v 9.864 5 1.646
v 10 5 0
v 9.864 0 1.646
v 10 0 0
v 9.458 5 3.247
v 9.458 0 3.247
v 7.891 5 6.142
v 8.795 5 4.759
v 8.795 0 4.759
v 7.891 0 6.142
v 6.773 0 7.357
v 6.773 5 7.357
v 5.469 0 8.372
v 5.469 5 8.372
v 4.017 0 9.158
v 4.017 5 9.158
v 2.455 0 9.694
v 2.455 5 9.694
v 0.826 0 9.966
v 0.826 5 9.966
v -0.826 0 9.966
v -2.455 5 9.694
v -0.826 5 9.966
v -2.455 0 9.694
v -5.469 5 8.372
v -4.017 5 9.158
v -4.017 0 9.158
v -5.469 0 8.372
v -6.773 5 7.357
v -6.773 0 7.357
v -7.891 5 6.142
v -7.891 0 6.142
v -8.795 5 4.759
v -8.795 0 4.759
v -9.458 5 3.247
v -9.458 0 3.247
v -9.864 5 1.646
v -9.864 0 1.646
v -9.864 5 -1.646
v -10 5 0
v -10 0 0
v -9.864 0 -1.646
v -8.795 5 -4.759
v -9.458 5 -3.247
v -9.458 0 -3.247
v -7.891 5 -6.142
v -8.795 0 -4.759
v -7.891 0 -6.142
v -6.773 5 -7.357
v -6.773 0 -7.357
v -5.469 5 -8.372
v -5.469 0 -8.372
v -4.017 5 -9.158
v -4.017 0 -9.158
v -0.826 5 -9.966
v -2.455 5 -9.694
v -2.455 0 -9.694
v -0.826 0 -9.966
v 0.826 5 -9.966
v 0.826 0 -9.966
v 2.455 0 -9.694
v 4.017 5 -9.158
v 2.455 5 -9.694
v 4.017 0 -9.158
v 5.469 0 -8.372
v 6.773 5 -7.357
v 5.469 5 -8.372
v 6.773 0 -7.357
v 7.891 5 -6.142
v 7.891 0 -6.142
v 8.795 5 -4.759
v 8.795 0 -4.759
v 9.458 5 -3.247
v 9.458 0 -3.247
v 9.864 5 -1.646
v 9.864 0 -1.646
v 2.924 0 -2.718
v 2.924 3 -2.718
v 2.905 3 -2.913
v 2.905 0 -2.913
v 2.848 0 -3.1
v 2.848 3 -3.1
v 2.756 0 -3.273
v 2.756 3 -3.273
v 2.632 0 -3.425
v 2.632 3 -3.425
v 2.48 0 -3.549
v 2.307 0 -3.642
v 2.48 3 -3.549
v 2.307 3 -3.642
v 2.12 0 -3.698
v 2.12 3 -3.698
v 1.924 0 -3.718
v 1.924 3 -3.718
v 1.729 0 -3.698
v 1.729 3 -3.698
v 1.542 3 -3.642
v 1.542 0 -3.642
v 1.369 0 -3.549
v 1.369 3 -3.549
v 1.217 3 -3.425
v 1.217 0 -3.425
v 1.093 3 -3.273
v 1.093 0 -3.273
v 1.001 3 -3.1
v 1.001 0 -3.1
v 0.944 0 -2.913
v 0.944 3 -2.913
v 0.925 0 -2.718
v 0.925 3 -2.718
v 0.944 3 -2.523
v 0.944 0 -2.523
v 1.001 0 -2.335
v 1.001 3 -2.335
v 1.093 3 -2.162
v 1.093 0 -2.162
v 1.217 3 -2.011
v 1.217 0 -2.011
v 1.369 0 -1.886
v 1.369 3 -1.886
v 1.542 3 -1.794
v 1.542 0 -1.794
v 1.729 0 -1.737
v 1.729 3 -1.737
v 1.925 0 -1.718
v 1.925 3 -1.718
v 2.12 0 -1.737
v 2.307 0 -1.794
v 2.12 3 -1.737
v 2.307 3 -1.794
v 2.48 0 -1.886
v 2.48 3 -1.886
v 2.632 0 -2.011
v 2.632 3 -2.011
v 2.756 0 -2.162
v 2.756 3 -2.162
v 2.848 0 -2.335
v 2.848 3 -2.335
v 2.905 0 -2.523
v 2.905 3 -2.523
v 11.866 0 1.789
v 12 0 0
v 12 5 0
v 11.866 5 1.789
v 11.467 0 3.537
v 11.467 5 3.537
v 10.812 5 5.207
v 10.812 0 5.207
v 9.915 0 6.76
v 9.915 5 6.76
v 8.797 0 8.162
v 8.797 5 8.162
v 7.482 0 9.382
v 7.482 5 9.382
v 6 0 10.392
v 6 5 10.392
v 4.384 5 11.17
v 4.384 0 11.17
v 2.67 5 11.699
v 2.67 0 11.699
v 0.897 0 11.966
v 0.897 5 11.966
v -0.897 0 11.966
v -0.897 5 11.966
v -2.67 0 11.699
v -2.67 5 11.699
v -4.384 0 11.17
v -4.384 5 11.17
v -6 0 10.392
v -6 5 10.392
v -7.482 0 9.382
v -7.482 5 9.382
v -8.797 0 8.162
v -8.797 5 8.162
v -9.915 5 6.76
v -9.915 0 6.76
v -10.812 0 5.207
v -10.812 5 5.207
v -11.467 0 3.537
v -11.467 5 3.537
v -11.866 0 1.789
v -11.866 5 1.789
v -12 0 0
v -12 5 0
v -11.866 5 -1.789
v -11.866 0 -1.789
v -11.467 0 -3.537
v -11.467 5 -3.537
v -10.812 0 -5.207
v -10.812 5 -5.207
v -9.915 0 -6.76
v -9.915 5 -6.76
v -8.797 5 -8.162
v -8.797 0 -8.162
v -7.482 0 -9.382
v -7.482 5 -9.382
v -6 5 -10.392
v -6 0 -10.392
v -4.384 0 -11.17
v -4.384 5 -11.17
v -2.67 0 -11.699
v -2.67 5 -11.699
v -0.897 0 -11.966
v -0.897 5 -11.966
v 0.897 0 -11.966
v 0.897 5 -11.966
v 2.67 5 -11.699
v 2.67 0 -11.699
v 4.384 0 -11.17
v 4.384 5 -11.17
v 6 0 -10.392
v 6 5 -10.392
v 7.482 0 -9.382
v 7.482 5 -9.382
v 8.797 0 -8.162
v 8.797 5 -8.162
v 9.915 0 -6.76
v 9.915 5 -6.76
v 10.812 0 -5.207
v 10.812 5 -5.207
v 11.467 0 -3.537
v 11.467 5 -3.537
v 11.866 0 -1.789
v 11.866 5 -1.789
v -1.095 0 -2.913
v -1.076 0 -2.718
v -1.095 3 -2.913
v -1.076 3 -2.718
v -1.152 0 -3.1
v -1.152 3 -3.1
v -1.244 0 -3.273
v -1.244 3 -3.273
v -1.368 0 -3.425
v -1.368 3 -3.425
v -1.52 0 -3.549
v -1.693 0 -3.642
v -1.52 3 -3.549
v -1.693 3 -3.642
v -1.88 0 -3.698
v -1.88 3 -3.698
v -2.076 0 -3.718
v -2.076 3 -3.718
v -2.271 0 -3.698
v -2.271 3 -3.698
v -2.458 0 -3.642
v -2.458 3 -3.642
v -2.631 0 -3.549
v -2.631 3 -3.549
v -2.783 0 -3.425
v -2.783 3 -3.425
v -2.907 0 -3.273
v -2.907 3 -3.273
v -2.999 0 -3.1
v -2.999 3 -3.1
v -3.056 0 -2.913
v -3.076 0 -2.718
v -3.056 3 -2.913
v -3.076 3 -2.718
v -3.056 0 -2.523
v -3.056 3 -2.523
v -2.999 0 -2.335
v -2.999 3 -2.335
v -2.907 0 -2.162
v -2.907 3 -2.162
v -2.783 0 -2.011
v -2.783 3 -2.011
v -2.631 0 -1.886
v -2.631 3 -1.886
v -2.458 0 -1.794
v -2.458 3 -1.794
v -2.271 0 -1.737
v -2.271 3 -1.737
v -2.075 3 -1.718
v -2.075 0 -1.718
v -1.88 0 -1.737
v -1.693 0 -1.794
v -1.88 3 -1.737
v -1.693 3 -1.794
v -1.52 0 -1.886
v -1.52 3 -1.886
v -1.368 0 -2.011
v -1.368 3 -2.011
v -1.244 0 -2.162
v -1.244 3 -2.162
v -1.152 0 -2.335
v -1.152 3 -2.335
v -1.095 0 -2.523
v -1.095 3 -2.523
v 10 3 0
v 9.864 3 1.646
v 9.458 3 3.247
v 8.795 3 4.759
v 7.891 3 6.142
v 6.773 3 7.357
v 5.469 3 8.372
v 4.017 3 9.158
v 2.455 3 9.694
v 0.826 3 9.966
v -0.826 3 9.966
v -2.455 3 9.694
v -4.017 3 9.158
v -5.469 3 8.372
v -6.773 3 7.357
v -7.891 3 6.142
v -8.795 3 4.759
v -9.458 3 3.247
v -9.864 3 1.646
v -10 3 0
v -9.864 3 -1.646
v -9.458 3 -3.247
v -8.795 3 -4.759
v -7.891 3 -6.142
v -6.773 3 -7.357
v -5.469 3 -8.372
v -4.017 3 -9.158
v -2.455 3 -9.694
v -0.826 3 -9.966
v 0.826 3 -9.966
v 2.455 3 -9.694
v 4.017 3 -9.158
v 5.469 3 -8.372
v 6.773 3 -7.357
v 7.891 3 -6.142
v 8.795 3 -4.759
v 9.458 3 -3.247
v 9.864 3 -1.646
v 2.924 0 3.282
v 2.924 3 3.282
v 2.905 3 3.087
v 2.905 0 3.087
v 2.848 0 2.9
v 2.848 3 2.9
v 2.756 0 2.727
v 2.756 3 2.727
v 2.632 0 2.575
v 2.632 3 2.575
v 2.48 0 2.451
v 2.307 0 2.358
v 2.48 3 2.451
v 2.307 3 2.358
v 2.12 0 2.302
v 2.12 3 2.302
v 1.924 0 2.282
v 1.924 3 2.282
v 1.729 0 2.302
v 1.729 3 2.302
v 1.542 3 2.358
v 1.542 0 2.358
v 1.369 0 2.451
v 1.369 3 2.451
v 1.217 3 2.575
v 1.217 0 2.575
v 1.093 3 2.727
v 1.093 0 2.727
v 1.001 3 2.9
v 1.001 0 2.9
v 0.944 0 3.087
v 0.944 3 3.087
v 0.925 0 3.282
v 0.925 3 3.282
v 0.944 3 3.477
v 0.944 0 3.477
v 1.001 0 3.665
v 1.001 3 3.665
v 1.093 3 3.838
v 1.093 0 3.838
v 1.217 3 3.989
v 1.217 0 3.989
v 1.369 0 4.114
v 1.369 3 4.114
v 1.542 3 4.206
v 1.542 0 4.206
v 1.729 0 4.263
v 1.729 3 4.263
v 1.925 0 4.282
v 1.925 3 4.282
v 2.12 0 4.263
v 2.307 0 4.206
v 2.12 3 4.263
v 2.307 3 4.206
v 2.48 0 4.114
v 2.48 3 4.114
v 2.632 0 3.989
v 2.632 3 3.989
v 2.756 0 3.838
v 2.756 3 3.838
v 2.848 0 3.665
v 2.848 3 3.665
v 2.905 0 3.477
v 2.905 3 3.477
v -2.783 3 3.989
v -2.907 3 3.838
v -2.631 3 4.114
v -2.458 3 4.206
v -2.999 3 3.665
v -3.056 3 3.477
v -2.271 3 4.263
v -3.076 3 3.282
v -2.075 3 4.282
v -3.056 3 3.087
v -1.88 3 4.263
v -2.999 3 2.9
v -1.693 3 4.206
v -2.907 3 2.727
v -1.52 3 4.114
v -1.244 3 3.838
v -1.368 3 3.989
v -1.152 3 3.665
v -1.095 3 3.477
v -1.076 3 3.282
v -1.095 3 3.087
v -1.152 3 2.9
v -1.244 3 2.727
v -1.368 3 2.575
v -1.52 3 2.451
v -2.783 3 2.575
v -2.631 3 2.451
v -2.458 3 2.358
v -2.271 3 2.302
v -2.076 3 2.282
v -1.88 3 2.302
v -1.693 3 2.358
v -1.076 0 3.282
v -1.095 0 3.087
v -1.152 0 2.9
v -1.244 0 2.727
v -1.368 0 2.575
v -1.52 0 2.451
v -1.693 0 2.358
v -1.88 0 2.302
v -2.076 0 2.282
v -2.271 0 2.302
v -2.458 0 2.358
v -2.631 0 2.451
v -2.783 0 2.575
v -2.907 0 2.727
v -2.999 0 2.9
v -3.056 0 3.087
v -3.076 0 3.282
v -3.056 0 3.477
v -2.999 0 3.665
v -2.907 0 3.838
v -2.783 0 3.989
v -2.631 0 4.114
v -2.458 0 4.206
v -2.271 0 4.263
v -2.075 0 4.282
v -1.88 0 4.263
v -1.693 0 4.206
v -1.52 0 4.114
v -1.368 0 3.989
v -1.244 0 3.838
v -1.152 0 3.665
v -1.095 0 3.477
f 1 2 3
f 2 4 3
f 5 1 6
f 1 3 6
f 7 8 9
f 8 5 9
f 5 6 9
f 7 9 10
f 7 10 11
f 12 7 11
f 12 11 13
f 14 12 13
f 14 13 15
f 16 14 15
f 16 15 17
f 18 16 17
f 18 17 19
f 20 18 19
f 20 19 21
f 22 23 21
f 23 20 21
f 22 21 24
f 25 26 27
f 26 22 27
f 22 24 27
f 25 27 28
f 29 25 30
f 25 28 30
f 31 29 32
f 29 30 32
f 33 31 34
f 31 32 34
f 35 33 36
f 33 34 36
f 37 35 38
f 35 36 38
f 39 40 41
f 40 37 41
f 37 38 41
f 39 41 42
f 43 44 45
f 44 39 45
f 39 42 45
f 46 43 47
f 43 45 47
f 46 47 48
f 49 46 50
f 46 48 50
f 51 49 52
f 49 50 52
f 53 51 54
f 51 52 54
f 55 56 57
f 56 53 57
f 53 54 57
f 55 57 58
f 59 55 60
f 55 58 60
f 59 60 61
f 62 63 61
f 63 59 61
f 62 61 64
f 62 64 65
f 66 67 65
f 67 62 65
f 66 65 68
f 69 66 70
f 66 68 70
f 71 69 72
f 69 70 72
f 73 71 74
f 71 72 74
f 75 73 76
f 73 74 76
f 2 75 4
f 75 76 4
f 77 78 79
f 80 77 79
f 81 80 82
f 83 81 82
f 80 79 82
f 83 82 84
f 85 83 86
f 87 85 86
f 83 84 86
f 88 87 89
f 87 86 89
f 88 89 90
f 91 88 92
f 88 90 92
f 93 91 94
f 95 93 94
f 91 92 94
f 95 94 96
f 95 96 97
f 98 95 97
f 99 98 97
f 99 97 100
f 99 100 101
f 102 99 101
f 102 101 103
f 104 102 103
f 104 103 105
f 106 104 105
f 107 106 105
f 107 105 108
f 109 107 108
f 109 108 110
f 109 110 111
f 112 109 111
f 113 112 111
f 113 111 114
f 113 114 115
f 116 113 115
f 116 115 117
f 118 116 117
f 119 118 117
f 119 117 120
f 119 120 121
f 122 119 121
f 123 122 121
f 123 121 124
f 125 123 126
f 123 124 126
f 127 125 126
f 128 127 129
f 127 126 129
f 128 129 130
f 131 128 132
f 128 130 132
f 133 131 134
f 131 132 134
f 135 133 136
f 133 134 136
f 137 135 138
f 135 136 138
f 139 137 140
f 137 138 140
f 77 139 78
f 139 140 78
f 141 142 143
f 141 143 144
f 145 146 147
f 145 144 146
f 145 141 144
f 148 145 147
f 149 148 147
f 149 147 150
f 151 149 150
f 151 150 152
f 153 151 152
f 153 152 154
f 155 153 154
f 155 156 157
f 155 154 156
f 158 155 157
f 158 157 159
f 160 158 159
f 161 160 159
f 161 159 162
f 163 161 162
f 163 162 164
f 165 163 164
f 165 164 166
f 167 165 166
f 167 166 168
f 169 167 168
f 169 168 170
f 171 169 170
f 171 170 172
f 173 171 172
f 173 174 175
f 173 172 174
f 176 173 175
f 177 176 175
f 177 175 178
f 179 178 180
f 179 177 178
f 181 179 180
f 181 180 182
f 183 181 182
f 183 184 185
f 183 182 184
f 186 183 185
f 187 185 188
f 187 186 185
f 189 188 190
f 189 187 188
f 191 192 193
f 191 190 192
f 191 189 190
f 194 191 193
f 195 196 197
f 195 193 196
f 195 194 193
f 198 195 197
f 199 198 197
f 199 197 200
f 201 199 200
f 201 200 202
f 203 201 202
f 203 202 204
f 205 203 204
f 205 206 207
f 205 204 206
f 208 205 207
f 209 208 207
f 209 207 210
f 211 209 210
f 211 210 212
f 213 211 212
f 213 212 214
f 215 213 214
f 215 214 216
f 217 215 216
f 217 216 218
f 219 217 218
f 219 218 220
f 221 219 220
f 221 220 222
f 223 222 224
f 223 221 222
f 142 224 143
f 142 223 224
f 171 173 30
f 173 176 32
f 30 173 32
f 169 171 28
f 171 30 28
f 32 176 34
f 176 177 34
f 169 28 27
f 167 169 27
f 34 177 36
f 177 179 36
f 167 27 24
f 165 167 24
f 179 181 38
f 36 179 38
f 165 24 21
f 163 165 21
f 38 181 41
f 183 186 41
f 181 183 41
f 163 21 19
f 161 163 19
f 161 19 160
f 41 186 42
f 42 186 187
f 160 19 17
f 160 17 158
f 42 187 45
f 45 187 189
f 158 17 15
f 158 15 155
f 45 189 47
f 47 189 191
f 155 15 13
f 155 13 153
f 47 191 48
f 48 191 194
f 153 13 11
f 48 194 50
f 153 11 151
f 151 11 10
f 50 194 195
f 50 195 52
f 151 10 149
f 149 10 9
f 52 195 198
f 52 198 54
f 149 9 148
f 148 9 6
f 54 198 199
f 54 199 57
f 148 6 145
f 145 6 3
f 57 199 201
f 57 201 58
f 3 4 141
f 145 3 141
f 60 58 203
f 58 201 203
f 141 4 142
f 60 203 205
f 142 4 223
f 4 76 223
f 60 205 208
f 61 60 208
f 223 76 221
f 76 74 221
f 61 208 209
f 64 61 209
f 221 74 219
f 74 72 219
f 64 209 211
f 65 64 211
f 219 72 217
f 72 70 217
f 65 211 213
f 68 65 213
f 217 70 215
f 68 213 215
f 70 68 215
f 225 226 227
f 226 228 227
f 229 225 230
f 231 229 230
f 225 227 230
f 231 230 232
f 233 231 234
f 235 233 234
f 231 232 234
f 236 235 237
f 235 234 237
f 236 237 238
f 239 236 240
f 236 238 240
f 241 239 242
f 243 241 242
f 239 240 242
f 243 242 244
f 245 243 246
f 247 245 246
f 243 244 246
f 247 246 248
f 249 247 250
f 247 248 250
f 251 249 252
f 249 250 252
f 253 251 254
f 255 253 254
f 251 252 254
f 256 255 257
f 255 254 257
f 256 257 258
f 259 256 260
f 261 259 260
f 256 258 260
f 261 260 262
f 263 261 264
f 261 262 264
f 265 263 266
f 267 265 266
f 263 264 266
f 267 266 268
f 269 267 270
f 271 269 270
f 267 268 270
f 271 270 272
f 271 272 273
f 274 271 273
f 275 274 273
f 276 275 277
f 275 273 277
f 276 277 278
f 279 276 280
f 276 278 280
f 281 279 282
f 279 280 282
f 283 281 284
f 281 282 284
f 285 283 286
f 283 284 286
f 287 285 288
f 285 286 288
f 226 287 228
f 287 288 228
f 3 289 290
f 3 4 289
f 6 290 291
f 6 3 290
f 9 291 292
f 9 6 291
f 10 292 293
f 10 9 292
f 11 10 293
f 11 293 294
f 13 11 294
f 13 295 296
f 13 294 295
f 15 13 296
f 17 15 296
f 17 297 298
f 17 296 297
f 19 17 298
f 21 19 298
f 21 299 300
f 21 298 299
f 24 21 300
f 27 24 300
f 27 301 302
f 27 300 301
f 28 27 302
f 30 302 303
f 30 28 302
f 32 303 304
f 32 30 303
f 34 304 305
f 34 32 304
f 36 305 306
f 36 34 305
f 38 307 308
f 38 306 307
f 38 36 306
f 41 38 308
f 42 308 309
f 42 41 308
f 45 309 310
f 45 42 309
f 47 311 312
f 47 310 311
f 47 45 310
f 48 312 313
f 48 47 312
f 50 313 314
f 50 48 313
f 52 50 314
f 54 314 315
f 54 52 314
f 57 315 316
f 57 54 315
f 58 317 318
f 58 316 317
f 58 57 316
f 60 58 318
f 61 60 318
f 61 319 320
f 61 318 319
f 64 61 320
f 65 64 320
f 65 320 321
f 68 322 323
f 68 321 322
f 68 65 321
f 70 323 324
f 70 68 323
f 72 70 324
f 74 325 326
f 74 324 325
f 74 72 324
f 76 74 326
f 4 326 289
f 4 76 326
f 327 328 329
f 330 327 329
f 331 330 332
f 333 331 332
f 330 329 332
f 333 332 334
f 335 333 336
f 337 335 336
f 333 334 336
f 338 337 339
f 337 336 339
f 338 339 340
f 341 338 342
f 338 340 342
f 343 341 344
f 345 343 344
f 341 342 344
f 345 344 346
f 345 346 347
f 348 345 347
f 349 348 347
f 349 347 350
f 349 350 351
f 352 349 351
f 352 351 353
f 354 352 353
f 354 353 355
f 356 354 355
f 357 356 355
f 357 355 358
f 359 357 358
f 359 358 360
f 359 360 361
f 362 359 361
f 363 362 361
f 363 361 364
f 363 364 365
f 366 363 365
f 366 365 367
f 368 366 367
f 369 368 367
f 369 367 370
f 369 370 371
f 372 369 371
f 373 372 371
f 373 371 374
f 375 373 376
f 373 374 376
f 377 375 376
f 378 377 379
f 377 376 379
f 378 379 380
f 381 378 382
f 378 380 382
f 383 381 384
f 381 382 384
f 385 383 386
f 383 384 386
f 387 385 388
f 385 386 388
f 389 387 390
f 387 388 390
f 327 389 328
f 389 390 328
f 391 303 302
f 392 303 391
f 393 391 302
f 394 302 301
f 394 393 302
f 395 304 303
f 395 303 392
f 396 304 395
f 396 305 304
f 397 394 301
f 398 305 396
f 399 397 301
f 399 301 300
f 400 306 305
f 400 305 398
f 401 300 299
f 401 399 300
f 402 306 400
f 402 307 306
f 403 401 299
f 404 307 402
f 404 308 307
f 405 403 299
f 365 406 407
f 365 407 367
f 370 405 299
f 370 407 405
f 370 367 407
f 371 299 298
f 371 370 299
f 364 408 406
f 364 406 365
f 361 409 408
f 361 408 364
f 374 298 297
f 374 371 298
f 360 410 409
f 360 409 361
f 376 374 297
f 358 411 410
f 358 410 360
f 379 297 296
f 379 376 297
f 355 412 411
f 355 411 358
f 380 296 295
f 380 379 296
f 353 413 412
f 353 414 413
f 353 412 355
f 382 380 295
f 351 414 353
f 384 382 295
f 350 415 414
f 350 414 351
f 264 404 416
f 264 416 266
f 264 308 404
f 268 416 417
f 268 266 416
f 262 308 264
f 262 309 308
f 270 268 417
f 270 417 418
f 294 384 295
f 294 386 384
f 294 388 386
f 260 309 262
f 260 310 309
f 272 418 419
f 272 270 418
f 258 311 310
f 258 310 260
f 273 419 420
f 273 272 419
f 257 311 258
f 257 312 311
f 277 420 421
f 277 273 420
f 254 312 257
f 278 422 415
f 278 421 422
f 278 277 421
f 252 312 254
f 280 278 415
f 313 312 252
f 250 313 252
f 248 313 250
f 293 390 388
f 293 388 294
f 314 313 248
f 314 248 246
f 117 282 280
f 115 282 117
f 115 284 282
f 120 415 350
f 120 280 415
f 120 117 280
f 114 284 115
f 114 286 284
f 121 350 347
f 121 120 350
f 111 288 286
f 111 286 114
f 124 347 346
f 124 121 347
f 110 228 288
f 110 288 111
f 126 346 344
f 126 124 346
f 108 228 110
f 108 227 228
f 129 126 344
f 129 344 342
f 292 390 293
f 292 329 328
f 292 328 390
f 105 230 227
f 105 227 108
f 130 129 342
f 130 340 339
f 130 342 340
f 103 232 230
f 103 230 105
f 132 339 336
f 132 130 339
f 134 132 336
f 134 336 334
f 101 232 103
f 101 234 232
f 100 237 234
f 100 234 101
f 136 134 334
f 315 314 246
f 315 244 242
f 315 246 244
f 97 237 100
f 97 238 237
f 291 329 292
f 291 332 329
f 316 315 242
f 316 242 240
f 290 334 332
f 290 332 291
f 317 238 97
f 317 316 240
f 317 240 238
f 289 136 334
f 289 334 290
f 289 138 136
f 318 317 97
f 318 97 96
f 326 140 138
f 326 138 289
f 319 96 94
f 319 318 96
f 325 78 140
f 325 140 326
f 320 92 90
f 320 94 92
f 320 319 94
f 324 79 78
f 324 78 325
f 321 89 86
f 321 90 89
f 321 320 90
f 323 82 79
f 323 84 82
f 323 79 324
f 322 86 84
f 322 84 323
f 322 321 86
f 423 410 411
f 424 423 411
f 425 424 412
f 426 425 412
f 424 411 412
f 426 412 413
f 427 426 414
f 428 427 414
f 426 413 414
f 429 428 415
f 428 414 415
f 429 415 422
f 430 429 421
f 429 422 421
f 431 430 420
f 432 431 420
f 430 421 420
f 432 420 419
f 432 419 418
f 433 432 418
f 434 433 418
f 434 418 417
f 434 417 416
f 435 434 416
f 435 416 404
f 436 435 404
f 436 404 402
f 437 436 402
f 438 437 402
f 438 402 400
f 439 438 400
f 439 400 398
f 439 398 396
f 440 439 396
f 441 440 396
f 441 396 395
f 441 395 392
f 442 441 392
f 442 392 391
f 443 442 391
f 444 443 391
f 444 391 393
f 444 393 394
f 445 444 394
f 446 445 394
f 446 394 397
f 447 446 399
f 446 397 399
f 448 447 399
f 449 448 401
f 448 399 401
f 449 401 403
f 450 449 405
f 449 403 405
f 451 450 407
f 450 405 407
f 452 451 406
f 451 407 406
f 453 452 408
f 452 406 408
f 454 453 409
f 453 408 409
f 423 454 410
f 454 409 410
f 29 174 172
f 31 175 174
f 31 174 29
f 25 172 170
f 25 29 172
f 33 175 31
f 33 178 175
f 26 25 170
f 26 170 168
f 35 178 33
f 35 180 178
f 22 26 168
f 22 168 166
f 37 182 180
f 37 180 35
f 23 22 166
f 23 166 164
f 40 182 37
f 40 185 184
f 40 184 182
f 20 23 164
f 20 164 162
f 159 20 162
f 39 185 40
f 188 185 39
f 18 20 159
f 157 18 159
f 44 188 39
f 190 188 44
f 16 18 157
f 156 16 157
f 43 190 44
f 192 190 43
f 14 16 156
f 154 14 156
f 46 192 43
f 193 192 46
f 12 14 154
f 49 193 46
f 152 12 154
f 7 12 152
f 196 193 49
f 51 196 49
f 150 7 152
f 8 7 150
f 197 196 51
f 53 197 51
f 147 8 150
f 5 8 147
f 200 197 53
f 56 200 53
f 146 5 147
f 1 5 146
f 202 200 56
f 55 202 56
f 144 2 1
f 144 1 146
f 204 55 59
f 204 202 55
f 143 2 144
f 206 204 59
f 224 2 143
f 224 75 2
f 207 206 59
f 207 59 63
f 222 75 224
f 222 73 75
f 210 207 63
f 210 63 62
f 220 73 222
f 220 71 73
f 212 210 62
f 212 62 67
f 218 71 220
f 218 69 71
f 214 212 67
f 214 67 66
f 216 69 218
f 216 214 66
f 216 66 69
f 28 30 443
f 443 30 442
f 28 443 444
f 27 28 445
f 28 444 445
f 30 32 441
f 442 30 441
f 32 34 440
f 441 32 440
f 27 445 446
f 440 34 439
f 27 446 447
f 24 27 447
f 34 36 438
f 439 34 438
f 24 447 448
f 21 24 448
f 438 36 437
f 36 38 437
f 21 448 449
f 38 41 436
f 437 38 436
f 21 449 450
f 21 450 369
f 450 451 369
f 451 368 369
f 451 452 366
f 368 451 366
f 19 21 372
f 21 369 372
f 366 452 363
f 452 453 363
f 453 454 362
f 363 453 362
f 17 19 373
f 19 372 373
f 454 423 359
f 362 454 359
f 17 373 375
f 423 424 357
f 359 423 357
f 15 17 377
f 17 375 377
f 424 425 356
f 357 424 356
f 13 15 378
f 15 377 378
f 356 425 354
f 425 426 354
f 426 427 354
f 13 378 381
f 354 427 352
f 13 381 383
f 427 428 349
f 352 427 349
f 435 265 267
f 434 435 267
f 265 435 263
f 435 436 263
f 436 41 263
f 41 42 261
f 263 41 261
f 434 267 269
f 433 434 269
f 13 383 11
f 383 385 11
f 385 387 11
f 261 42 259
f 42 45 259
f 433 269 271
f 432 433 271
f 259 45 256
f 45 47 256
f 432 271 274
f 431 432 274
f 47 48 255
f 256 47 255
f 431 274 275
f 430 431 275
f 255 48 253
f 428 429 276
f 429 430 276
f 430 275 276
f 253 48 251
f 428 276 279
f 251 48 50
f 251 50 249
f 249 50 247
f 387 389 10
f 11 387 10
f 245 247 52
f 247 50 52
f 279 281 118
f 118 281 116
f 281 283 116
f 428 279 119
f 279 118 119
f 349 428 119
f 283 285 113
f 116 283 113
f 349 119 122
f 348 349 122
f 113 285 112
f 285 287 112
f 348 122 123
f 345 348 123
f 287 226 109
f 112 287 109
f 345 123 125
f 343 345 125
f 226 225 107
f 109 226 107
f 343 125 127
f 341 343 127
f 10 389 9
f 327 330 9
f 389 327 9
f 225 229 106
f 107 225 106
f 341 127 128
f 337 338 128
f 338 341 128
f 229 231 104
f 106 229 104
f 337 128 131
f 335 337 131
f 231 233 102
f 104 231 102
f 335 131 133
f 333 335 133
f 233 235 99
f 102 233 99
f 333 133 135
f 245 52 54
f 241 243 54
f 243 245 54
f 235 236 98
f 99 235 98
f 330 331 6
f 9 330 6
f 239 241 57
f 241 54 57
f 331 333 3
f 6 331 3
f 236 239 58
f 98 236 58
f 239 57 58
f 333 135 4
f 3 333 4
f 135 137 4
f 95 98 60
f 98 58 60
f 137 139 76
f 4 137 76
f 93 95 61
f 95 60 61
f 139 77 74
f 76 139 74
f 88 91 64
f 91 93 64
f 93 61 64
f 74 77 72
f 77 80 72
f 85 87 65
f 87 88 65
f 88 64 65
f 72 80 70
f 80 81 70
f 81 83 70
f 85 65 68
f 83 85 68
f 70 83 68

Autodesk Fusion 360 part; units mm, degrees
sketch "草图1" plane through (0, 0, 0) normal (0, 1, 0) x (1, 0, 0)
  circle A0 centre (0, 0) radius 10
  circle A1 centre (0, 0) radius 12
  dimension "d1" = 20
  dimension "d2" = 2
extrude "拉伸1" add sketch "草图1" along normal blind 3 contours A0 makes body 1
extrude "拉伸2" add sketch "草图1" along normal blind 5 separate body makes body 2
cylinder "圆柱体基本要素1" add diameter 2 height 20 placed x (1, 0, 0) y (0, 0, -1) z (0, 1, 0) at (0, 0, 25) separate body makes body 3
move_body "移动1" bodies 3 to x (1, 0, 0) y (0, 1, 0) z (0, 0, 1) at (0.0076, 0, -25.0072)
pattern_linear "R-阵列1" count 2 spacing 6 along (0, 0, 1) count 2 spacing 4 along (-1, 0, 0) of bodies 3 makes body 4 at (1.0026, 13.3333, 6.0924) makes body 5 at (-2.9974, 13.3333, 0.0924) makes body 6 at (-2.9974, 13.3333, 6.0924)
move_body "移动2" bodies 5 3 4 6 to x (1, 0, 0) y (0, 1, 0) z (0, 0, 1) at (1.7837, 0, -3.11)
move_body "移动3" bodies 3 4 5 6 to x (1, 0, 0) y (0, 1, 0) z (0, 0, 1) at (0.1332, 0, 0.3995)
combine "合并1" operation cut target body 1 tool bodies 3 4 5 6
